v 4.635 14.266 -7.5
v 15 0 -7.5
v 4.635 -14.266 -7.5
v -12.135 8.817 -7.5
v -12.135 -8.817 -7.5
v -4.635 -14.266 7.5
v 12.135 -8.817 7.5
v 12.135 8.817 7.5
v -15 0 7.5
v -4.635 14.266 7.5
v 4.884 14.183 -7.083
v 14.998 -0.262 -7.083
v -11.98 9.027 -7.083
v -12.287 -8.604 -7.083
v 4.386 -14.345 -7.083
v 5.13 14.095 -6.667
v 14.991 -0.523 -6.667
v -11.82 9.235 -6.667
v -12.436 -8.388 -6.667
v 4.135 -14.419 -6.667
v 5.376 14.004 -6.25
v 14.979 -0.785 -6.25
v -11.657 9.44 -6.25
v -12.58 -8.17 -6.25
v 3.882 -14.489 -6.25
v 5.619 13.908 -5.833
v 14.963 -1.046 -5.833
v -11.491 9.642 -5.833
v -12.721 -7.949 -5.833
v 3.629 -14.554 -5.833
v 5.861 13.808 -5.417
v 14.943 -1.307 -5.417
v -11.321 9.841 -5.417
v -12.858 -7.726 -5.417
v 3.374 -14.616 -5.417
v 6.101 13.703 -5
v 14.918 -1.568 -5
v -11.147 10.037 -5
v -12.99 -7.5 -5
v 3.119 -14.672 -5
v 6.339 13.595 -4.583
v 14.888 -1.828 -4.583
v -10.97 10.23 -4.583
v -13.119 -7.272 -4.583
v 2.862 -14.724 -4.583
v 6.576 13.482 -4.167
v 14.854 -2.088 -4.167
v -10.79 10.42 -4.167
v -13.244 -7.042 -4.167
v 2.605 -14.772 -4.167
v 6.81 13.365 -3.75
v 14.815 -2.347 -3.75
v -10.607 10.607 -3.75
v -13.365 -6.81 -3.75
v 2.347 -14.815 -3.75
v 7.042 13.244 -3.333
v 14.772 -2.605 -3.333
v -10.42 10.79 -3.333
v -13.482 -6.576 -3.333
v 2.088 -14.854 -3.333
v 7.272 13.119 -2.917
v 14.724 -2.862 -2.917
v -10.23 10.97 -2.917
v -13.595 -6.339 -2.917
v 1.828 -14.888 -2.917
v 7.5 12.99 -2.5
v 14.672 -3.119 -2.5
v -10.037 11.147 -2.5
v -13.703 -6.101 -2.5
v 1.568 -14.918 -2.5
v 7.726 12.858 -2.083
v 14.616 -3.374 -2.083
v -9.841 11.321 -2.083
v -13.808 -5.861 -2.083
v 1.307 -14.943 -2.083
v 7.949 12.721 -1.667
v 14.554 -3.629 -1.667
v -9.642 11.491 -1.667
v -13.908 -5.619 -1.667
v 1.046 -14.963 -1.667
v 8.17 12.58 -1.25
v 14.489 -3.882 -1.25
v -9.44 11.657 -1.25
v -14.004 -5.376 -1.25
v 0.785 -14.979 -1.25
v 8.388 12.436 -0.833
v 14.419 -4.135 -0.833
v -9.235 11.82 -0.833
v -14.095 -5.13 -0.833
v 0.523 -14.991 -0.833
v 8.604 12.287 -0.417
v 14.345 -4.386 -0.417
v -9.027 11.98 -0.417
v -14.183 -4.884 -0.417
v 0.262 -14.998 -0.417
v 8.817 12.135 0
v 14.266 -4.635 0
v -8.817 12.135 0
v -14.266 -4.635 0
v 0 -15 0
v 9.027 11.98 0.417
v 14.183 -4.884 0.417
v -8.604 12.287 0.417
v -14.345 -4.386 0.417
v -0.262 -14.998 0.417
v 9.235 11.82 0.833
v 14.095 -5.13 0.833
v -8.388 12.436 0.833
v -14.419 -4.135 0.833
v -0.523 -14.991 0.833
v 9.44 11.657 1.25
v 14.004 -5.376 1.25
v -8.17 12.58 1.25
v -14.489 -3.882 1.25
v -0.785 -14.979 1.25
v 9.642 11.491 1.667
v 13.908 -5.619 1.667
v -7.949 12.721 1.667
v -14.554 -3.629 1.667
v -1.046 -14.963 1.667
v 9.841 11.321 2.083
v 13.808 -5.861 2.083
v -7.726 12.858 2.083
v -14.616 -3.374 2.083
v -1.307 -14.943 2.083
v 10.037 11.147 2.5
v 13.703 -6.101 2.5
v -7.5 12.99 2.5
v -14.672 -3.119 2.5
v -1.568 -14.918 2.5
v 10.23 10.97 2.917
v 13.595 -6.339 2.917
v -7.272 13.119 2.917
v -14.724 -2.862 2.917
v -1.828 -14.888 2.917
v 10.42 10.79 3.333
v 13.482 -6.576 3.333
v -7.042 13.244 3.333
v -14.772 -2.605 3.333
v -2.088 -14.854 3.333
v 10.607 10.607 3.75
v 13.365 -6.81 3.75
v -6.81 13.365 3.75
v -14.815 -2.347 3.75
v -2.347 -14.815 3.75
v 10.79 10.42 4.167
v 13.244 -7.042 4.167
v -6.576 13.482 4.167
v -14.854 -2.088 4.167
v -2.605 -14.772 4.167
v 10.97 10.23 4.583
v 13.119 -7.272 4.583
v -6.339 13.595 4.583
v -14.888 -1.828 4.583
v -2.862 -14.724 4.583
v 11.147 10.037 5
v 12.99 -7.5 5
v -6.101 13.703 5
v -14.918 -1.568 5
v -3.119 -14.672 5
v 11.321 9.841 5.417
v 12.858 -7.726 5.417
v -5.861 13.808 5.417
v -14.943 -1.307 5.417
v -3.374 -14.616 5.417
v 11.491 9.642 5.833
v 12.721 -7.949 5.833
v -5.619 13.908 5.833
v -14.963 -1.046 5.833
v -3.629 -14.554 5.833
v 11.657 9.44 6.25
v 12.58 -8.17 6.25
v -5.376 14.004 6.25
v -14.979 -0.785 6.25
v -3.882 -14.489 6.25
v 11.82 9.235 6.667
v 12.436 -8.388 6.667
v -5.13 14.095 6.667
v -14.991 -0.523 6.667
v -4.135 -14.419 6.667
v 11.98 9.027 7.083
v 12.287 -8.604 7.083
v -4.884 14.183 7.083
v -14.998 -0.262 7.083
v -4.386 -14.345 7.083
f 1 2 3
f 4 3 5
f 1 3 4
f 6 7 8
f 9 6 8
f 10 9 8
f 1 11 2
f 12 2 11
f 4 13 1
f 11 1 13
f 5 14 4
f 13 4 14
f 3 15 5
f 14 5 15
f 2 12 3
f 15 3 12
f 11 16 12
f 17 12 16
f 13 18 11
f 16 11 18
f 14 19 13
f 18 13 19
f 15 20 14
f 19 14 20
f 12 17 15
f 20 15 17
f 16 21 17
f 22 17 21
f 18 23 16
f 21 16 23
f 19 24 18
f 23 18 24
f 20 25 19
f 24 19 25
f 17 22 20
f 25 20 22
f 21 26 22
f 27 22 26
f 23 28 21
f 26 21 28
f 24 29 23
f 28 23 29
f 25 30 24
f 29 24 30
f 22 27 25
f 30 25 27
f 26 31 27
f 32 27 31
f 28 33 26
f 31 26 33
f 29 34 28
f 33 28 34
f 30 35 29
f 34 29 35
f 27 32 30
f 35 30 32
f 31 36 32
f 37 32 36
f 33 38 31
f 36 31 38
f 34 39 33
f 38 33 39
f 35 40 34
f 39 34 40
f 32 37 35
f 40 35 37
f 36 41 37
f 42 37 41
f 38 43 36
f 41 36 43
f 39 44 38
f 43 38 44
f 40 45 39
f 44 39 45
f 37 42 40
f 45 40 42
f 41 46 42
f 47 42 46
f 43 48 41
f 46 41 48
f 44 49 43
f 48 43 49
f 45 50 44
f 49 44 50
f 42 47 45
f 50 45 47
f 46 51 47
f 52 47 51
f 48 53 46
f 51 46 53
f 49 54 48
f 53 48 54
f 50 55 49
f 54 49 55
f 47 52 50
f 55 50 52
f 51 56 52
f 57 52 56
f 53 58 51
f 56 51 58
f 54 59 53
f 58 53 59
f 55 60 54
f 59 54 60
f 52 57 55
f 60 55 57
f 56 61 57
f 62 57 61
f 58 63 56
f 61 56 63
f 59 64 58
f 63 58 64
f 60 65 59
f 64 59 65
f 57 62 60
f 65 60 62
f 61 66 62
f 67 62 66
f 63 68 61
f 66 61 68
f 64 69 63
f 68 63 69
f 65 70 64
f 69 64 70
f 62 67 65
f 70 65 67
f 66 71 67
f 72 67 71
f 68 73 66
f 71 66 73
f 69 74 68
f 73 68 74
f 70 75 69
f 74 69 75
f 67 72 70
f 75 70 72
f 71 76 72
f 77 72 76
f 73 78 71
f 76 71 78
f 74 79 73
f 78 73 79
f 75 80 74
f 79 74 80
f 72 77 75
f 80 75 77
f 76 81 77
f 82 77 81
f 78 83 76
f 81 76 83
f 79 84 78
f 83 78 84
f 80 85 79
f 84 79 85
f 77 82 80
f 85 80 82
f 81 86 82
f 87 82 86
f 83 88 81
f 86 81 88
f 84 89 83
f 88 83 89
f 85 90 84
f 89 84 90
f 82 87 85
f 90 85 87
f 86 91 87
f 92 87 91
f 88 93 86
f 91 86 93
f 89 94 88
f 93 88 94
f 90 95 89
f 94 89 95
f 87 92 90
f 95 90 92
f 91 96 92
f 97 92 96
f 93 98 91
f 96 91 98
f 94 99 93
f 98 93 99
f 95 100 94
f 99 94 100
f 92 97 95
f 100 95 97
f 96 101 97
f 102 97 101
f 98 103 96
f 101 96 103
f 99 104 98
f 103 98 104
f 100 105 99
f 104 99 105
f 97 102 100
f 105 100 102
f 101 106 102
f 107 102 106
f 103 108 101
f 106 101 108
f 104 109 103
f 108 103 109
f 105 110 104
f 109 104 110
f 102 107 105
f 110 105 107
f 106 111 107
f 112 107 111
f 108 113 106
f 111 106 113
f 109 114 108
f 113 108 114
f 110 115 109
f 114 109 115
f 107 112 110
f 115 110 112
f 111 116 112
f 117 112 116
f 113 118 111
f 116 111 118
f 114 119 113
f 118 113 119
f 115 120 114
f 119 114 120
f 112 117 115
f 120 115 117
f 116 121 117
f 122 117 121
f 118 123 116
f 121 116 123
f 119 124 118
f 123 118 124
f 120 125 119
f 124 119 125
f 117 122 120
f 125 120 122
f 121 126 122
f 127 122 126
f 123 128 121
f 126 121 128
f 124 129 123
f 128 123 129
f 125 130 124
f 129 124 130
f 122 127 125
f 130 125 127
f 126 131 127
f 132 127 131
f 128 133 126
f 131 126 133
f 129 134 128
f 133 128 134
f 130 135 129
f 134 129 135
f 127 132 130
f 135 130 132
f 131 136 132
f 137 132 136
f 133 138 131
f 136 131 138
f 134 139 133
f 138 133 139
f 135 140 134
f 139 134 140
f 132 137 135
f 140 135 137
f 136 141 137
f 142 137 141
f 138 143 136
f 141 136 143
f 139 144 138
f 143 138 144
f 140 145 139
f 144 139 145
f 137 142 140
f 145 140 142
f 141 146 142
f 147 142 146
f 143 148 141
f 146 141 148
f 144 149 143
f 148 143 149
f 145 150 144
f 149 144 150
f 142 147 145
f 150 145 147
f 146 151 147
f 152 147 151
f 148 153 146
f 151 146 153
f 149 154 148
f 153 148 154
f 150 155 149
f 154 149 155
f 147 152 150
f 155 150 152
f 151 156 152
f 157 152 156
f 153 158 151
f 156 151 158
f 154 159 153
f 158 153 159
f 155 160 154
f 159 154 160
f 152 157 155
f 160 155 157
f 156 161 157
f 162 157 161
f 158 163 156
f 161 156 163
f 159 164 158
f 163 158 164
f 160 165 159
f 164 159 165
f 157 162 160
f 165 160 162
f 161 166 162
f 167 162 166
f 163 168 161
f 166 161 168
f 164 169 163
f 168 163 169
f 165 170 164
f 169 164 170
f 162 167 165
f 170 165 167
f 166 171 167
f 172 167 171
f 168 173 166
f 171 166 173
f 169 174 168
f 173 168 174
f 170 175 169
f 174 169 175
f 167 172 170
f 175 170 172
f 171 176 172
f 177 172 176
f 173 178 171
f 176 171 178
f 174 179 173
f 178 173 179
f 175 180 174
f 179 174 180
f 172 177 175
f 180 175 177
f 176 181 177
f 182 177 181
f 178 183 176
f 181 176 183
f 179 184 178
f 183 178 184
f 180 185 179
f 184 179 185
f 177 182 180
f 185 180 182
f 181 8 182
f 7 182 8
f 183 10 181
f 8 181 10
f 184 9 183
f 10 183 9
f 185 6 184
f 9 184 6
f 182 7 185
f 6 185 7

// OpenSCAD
$fa = 1;
$fs = 0.4;
radius = 15;
angle_increment = 72;

function get_pentagon_points(r) = [
    [r * cos(angle_increment * 0),
     r * sin(angle_increment * 0)],
    [r * cos(angle_increment * 1),
     r * sin(angle_increment * 1)],
    [r * cos(angle_increment * 2),
     r * sin(angle_increment * 2)],
    [r * cos(angle_increment * 3),
     r * sin(angle_increment * 3)],
    [r * cos(angle_increment * 4),
     r * sin(angle_increment * 4)],
    [r * cos(angle_increment * 5),
     r * sin(angle_increment * 5)]];

linear_extrude(radius, center=true, convexity = 10, twist = 36)
polygon(get_pentagon_points(radius));
